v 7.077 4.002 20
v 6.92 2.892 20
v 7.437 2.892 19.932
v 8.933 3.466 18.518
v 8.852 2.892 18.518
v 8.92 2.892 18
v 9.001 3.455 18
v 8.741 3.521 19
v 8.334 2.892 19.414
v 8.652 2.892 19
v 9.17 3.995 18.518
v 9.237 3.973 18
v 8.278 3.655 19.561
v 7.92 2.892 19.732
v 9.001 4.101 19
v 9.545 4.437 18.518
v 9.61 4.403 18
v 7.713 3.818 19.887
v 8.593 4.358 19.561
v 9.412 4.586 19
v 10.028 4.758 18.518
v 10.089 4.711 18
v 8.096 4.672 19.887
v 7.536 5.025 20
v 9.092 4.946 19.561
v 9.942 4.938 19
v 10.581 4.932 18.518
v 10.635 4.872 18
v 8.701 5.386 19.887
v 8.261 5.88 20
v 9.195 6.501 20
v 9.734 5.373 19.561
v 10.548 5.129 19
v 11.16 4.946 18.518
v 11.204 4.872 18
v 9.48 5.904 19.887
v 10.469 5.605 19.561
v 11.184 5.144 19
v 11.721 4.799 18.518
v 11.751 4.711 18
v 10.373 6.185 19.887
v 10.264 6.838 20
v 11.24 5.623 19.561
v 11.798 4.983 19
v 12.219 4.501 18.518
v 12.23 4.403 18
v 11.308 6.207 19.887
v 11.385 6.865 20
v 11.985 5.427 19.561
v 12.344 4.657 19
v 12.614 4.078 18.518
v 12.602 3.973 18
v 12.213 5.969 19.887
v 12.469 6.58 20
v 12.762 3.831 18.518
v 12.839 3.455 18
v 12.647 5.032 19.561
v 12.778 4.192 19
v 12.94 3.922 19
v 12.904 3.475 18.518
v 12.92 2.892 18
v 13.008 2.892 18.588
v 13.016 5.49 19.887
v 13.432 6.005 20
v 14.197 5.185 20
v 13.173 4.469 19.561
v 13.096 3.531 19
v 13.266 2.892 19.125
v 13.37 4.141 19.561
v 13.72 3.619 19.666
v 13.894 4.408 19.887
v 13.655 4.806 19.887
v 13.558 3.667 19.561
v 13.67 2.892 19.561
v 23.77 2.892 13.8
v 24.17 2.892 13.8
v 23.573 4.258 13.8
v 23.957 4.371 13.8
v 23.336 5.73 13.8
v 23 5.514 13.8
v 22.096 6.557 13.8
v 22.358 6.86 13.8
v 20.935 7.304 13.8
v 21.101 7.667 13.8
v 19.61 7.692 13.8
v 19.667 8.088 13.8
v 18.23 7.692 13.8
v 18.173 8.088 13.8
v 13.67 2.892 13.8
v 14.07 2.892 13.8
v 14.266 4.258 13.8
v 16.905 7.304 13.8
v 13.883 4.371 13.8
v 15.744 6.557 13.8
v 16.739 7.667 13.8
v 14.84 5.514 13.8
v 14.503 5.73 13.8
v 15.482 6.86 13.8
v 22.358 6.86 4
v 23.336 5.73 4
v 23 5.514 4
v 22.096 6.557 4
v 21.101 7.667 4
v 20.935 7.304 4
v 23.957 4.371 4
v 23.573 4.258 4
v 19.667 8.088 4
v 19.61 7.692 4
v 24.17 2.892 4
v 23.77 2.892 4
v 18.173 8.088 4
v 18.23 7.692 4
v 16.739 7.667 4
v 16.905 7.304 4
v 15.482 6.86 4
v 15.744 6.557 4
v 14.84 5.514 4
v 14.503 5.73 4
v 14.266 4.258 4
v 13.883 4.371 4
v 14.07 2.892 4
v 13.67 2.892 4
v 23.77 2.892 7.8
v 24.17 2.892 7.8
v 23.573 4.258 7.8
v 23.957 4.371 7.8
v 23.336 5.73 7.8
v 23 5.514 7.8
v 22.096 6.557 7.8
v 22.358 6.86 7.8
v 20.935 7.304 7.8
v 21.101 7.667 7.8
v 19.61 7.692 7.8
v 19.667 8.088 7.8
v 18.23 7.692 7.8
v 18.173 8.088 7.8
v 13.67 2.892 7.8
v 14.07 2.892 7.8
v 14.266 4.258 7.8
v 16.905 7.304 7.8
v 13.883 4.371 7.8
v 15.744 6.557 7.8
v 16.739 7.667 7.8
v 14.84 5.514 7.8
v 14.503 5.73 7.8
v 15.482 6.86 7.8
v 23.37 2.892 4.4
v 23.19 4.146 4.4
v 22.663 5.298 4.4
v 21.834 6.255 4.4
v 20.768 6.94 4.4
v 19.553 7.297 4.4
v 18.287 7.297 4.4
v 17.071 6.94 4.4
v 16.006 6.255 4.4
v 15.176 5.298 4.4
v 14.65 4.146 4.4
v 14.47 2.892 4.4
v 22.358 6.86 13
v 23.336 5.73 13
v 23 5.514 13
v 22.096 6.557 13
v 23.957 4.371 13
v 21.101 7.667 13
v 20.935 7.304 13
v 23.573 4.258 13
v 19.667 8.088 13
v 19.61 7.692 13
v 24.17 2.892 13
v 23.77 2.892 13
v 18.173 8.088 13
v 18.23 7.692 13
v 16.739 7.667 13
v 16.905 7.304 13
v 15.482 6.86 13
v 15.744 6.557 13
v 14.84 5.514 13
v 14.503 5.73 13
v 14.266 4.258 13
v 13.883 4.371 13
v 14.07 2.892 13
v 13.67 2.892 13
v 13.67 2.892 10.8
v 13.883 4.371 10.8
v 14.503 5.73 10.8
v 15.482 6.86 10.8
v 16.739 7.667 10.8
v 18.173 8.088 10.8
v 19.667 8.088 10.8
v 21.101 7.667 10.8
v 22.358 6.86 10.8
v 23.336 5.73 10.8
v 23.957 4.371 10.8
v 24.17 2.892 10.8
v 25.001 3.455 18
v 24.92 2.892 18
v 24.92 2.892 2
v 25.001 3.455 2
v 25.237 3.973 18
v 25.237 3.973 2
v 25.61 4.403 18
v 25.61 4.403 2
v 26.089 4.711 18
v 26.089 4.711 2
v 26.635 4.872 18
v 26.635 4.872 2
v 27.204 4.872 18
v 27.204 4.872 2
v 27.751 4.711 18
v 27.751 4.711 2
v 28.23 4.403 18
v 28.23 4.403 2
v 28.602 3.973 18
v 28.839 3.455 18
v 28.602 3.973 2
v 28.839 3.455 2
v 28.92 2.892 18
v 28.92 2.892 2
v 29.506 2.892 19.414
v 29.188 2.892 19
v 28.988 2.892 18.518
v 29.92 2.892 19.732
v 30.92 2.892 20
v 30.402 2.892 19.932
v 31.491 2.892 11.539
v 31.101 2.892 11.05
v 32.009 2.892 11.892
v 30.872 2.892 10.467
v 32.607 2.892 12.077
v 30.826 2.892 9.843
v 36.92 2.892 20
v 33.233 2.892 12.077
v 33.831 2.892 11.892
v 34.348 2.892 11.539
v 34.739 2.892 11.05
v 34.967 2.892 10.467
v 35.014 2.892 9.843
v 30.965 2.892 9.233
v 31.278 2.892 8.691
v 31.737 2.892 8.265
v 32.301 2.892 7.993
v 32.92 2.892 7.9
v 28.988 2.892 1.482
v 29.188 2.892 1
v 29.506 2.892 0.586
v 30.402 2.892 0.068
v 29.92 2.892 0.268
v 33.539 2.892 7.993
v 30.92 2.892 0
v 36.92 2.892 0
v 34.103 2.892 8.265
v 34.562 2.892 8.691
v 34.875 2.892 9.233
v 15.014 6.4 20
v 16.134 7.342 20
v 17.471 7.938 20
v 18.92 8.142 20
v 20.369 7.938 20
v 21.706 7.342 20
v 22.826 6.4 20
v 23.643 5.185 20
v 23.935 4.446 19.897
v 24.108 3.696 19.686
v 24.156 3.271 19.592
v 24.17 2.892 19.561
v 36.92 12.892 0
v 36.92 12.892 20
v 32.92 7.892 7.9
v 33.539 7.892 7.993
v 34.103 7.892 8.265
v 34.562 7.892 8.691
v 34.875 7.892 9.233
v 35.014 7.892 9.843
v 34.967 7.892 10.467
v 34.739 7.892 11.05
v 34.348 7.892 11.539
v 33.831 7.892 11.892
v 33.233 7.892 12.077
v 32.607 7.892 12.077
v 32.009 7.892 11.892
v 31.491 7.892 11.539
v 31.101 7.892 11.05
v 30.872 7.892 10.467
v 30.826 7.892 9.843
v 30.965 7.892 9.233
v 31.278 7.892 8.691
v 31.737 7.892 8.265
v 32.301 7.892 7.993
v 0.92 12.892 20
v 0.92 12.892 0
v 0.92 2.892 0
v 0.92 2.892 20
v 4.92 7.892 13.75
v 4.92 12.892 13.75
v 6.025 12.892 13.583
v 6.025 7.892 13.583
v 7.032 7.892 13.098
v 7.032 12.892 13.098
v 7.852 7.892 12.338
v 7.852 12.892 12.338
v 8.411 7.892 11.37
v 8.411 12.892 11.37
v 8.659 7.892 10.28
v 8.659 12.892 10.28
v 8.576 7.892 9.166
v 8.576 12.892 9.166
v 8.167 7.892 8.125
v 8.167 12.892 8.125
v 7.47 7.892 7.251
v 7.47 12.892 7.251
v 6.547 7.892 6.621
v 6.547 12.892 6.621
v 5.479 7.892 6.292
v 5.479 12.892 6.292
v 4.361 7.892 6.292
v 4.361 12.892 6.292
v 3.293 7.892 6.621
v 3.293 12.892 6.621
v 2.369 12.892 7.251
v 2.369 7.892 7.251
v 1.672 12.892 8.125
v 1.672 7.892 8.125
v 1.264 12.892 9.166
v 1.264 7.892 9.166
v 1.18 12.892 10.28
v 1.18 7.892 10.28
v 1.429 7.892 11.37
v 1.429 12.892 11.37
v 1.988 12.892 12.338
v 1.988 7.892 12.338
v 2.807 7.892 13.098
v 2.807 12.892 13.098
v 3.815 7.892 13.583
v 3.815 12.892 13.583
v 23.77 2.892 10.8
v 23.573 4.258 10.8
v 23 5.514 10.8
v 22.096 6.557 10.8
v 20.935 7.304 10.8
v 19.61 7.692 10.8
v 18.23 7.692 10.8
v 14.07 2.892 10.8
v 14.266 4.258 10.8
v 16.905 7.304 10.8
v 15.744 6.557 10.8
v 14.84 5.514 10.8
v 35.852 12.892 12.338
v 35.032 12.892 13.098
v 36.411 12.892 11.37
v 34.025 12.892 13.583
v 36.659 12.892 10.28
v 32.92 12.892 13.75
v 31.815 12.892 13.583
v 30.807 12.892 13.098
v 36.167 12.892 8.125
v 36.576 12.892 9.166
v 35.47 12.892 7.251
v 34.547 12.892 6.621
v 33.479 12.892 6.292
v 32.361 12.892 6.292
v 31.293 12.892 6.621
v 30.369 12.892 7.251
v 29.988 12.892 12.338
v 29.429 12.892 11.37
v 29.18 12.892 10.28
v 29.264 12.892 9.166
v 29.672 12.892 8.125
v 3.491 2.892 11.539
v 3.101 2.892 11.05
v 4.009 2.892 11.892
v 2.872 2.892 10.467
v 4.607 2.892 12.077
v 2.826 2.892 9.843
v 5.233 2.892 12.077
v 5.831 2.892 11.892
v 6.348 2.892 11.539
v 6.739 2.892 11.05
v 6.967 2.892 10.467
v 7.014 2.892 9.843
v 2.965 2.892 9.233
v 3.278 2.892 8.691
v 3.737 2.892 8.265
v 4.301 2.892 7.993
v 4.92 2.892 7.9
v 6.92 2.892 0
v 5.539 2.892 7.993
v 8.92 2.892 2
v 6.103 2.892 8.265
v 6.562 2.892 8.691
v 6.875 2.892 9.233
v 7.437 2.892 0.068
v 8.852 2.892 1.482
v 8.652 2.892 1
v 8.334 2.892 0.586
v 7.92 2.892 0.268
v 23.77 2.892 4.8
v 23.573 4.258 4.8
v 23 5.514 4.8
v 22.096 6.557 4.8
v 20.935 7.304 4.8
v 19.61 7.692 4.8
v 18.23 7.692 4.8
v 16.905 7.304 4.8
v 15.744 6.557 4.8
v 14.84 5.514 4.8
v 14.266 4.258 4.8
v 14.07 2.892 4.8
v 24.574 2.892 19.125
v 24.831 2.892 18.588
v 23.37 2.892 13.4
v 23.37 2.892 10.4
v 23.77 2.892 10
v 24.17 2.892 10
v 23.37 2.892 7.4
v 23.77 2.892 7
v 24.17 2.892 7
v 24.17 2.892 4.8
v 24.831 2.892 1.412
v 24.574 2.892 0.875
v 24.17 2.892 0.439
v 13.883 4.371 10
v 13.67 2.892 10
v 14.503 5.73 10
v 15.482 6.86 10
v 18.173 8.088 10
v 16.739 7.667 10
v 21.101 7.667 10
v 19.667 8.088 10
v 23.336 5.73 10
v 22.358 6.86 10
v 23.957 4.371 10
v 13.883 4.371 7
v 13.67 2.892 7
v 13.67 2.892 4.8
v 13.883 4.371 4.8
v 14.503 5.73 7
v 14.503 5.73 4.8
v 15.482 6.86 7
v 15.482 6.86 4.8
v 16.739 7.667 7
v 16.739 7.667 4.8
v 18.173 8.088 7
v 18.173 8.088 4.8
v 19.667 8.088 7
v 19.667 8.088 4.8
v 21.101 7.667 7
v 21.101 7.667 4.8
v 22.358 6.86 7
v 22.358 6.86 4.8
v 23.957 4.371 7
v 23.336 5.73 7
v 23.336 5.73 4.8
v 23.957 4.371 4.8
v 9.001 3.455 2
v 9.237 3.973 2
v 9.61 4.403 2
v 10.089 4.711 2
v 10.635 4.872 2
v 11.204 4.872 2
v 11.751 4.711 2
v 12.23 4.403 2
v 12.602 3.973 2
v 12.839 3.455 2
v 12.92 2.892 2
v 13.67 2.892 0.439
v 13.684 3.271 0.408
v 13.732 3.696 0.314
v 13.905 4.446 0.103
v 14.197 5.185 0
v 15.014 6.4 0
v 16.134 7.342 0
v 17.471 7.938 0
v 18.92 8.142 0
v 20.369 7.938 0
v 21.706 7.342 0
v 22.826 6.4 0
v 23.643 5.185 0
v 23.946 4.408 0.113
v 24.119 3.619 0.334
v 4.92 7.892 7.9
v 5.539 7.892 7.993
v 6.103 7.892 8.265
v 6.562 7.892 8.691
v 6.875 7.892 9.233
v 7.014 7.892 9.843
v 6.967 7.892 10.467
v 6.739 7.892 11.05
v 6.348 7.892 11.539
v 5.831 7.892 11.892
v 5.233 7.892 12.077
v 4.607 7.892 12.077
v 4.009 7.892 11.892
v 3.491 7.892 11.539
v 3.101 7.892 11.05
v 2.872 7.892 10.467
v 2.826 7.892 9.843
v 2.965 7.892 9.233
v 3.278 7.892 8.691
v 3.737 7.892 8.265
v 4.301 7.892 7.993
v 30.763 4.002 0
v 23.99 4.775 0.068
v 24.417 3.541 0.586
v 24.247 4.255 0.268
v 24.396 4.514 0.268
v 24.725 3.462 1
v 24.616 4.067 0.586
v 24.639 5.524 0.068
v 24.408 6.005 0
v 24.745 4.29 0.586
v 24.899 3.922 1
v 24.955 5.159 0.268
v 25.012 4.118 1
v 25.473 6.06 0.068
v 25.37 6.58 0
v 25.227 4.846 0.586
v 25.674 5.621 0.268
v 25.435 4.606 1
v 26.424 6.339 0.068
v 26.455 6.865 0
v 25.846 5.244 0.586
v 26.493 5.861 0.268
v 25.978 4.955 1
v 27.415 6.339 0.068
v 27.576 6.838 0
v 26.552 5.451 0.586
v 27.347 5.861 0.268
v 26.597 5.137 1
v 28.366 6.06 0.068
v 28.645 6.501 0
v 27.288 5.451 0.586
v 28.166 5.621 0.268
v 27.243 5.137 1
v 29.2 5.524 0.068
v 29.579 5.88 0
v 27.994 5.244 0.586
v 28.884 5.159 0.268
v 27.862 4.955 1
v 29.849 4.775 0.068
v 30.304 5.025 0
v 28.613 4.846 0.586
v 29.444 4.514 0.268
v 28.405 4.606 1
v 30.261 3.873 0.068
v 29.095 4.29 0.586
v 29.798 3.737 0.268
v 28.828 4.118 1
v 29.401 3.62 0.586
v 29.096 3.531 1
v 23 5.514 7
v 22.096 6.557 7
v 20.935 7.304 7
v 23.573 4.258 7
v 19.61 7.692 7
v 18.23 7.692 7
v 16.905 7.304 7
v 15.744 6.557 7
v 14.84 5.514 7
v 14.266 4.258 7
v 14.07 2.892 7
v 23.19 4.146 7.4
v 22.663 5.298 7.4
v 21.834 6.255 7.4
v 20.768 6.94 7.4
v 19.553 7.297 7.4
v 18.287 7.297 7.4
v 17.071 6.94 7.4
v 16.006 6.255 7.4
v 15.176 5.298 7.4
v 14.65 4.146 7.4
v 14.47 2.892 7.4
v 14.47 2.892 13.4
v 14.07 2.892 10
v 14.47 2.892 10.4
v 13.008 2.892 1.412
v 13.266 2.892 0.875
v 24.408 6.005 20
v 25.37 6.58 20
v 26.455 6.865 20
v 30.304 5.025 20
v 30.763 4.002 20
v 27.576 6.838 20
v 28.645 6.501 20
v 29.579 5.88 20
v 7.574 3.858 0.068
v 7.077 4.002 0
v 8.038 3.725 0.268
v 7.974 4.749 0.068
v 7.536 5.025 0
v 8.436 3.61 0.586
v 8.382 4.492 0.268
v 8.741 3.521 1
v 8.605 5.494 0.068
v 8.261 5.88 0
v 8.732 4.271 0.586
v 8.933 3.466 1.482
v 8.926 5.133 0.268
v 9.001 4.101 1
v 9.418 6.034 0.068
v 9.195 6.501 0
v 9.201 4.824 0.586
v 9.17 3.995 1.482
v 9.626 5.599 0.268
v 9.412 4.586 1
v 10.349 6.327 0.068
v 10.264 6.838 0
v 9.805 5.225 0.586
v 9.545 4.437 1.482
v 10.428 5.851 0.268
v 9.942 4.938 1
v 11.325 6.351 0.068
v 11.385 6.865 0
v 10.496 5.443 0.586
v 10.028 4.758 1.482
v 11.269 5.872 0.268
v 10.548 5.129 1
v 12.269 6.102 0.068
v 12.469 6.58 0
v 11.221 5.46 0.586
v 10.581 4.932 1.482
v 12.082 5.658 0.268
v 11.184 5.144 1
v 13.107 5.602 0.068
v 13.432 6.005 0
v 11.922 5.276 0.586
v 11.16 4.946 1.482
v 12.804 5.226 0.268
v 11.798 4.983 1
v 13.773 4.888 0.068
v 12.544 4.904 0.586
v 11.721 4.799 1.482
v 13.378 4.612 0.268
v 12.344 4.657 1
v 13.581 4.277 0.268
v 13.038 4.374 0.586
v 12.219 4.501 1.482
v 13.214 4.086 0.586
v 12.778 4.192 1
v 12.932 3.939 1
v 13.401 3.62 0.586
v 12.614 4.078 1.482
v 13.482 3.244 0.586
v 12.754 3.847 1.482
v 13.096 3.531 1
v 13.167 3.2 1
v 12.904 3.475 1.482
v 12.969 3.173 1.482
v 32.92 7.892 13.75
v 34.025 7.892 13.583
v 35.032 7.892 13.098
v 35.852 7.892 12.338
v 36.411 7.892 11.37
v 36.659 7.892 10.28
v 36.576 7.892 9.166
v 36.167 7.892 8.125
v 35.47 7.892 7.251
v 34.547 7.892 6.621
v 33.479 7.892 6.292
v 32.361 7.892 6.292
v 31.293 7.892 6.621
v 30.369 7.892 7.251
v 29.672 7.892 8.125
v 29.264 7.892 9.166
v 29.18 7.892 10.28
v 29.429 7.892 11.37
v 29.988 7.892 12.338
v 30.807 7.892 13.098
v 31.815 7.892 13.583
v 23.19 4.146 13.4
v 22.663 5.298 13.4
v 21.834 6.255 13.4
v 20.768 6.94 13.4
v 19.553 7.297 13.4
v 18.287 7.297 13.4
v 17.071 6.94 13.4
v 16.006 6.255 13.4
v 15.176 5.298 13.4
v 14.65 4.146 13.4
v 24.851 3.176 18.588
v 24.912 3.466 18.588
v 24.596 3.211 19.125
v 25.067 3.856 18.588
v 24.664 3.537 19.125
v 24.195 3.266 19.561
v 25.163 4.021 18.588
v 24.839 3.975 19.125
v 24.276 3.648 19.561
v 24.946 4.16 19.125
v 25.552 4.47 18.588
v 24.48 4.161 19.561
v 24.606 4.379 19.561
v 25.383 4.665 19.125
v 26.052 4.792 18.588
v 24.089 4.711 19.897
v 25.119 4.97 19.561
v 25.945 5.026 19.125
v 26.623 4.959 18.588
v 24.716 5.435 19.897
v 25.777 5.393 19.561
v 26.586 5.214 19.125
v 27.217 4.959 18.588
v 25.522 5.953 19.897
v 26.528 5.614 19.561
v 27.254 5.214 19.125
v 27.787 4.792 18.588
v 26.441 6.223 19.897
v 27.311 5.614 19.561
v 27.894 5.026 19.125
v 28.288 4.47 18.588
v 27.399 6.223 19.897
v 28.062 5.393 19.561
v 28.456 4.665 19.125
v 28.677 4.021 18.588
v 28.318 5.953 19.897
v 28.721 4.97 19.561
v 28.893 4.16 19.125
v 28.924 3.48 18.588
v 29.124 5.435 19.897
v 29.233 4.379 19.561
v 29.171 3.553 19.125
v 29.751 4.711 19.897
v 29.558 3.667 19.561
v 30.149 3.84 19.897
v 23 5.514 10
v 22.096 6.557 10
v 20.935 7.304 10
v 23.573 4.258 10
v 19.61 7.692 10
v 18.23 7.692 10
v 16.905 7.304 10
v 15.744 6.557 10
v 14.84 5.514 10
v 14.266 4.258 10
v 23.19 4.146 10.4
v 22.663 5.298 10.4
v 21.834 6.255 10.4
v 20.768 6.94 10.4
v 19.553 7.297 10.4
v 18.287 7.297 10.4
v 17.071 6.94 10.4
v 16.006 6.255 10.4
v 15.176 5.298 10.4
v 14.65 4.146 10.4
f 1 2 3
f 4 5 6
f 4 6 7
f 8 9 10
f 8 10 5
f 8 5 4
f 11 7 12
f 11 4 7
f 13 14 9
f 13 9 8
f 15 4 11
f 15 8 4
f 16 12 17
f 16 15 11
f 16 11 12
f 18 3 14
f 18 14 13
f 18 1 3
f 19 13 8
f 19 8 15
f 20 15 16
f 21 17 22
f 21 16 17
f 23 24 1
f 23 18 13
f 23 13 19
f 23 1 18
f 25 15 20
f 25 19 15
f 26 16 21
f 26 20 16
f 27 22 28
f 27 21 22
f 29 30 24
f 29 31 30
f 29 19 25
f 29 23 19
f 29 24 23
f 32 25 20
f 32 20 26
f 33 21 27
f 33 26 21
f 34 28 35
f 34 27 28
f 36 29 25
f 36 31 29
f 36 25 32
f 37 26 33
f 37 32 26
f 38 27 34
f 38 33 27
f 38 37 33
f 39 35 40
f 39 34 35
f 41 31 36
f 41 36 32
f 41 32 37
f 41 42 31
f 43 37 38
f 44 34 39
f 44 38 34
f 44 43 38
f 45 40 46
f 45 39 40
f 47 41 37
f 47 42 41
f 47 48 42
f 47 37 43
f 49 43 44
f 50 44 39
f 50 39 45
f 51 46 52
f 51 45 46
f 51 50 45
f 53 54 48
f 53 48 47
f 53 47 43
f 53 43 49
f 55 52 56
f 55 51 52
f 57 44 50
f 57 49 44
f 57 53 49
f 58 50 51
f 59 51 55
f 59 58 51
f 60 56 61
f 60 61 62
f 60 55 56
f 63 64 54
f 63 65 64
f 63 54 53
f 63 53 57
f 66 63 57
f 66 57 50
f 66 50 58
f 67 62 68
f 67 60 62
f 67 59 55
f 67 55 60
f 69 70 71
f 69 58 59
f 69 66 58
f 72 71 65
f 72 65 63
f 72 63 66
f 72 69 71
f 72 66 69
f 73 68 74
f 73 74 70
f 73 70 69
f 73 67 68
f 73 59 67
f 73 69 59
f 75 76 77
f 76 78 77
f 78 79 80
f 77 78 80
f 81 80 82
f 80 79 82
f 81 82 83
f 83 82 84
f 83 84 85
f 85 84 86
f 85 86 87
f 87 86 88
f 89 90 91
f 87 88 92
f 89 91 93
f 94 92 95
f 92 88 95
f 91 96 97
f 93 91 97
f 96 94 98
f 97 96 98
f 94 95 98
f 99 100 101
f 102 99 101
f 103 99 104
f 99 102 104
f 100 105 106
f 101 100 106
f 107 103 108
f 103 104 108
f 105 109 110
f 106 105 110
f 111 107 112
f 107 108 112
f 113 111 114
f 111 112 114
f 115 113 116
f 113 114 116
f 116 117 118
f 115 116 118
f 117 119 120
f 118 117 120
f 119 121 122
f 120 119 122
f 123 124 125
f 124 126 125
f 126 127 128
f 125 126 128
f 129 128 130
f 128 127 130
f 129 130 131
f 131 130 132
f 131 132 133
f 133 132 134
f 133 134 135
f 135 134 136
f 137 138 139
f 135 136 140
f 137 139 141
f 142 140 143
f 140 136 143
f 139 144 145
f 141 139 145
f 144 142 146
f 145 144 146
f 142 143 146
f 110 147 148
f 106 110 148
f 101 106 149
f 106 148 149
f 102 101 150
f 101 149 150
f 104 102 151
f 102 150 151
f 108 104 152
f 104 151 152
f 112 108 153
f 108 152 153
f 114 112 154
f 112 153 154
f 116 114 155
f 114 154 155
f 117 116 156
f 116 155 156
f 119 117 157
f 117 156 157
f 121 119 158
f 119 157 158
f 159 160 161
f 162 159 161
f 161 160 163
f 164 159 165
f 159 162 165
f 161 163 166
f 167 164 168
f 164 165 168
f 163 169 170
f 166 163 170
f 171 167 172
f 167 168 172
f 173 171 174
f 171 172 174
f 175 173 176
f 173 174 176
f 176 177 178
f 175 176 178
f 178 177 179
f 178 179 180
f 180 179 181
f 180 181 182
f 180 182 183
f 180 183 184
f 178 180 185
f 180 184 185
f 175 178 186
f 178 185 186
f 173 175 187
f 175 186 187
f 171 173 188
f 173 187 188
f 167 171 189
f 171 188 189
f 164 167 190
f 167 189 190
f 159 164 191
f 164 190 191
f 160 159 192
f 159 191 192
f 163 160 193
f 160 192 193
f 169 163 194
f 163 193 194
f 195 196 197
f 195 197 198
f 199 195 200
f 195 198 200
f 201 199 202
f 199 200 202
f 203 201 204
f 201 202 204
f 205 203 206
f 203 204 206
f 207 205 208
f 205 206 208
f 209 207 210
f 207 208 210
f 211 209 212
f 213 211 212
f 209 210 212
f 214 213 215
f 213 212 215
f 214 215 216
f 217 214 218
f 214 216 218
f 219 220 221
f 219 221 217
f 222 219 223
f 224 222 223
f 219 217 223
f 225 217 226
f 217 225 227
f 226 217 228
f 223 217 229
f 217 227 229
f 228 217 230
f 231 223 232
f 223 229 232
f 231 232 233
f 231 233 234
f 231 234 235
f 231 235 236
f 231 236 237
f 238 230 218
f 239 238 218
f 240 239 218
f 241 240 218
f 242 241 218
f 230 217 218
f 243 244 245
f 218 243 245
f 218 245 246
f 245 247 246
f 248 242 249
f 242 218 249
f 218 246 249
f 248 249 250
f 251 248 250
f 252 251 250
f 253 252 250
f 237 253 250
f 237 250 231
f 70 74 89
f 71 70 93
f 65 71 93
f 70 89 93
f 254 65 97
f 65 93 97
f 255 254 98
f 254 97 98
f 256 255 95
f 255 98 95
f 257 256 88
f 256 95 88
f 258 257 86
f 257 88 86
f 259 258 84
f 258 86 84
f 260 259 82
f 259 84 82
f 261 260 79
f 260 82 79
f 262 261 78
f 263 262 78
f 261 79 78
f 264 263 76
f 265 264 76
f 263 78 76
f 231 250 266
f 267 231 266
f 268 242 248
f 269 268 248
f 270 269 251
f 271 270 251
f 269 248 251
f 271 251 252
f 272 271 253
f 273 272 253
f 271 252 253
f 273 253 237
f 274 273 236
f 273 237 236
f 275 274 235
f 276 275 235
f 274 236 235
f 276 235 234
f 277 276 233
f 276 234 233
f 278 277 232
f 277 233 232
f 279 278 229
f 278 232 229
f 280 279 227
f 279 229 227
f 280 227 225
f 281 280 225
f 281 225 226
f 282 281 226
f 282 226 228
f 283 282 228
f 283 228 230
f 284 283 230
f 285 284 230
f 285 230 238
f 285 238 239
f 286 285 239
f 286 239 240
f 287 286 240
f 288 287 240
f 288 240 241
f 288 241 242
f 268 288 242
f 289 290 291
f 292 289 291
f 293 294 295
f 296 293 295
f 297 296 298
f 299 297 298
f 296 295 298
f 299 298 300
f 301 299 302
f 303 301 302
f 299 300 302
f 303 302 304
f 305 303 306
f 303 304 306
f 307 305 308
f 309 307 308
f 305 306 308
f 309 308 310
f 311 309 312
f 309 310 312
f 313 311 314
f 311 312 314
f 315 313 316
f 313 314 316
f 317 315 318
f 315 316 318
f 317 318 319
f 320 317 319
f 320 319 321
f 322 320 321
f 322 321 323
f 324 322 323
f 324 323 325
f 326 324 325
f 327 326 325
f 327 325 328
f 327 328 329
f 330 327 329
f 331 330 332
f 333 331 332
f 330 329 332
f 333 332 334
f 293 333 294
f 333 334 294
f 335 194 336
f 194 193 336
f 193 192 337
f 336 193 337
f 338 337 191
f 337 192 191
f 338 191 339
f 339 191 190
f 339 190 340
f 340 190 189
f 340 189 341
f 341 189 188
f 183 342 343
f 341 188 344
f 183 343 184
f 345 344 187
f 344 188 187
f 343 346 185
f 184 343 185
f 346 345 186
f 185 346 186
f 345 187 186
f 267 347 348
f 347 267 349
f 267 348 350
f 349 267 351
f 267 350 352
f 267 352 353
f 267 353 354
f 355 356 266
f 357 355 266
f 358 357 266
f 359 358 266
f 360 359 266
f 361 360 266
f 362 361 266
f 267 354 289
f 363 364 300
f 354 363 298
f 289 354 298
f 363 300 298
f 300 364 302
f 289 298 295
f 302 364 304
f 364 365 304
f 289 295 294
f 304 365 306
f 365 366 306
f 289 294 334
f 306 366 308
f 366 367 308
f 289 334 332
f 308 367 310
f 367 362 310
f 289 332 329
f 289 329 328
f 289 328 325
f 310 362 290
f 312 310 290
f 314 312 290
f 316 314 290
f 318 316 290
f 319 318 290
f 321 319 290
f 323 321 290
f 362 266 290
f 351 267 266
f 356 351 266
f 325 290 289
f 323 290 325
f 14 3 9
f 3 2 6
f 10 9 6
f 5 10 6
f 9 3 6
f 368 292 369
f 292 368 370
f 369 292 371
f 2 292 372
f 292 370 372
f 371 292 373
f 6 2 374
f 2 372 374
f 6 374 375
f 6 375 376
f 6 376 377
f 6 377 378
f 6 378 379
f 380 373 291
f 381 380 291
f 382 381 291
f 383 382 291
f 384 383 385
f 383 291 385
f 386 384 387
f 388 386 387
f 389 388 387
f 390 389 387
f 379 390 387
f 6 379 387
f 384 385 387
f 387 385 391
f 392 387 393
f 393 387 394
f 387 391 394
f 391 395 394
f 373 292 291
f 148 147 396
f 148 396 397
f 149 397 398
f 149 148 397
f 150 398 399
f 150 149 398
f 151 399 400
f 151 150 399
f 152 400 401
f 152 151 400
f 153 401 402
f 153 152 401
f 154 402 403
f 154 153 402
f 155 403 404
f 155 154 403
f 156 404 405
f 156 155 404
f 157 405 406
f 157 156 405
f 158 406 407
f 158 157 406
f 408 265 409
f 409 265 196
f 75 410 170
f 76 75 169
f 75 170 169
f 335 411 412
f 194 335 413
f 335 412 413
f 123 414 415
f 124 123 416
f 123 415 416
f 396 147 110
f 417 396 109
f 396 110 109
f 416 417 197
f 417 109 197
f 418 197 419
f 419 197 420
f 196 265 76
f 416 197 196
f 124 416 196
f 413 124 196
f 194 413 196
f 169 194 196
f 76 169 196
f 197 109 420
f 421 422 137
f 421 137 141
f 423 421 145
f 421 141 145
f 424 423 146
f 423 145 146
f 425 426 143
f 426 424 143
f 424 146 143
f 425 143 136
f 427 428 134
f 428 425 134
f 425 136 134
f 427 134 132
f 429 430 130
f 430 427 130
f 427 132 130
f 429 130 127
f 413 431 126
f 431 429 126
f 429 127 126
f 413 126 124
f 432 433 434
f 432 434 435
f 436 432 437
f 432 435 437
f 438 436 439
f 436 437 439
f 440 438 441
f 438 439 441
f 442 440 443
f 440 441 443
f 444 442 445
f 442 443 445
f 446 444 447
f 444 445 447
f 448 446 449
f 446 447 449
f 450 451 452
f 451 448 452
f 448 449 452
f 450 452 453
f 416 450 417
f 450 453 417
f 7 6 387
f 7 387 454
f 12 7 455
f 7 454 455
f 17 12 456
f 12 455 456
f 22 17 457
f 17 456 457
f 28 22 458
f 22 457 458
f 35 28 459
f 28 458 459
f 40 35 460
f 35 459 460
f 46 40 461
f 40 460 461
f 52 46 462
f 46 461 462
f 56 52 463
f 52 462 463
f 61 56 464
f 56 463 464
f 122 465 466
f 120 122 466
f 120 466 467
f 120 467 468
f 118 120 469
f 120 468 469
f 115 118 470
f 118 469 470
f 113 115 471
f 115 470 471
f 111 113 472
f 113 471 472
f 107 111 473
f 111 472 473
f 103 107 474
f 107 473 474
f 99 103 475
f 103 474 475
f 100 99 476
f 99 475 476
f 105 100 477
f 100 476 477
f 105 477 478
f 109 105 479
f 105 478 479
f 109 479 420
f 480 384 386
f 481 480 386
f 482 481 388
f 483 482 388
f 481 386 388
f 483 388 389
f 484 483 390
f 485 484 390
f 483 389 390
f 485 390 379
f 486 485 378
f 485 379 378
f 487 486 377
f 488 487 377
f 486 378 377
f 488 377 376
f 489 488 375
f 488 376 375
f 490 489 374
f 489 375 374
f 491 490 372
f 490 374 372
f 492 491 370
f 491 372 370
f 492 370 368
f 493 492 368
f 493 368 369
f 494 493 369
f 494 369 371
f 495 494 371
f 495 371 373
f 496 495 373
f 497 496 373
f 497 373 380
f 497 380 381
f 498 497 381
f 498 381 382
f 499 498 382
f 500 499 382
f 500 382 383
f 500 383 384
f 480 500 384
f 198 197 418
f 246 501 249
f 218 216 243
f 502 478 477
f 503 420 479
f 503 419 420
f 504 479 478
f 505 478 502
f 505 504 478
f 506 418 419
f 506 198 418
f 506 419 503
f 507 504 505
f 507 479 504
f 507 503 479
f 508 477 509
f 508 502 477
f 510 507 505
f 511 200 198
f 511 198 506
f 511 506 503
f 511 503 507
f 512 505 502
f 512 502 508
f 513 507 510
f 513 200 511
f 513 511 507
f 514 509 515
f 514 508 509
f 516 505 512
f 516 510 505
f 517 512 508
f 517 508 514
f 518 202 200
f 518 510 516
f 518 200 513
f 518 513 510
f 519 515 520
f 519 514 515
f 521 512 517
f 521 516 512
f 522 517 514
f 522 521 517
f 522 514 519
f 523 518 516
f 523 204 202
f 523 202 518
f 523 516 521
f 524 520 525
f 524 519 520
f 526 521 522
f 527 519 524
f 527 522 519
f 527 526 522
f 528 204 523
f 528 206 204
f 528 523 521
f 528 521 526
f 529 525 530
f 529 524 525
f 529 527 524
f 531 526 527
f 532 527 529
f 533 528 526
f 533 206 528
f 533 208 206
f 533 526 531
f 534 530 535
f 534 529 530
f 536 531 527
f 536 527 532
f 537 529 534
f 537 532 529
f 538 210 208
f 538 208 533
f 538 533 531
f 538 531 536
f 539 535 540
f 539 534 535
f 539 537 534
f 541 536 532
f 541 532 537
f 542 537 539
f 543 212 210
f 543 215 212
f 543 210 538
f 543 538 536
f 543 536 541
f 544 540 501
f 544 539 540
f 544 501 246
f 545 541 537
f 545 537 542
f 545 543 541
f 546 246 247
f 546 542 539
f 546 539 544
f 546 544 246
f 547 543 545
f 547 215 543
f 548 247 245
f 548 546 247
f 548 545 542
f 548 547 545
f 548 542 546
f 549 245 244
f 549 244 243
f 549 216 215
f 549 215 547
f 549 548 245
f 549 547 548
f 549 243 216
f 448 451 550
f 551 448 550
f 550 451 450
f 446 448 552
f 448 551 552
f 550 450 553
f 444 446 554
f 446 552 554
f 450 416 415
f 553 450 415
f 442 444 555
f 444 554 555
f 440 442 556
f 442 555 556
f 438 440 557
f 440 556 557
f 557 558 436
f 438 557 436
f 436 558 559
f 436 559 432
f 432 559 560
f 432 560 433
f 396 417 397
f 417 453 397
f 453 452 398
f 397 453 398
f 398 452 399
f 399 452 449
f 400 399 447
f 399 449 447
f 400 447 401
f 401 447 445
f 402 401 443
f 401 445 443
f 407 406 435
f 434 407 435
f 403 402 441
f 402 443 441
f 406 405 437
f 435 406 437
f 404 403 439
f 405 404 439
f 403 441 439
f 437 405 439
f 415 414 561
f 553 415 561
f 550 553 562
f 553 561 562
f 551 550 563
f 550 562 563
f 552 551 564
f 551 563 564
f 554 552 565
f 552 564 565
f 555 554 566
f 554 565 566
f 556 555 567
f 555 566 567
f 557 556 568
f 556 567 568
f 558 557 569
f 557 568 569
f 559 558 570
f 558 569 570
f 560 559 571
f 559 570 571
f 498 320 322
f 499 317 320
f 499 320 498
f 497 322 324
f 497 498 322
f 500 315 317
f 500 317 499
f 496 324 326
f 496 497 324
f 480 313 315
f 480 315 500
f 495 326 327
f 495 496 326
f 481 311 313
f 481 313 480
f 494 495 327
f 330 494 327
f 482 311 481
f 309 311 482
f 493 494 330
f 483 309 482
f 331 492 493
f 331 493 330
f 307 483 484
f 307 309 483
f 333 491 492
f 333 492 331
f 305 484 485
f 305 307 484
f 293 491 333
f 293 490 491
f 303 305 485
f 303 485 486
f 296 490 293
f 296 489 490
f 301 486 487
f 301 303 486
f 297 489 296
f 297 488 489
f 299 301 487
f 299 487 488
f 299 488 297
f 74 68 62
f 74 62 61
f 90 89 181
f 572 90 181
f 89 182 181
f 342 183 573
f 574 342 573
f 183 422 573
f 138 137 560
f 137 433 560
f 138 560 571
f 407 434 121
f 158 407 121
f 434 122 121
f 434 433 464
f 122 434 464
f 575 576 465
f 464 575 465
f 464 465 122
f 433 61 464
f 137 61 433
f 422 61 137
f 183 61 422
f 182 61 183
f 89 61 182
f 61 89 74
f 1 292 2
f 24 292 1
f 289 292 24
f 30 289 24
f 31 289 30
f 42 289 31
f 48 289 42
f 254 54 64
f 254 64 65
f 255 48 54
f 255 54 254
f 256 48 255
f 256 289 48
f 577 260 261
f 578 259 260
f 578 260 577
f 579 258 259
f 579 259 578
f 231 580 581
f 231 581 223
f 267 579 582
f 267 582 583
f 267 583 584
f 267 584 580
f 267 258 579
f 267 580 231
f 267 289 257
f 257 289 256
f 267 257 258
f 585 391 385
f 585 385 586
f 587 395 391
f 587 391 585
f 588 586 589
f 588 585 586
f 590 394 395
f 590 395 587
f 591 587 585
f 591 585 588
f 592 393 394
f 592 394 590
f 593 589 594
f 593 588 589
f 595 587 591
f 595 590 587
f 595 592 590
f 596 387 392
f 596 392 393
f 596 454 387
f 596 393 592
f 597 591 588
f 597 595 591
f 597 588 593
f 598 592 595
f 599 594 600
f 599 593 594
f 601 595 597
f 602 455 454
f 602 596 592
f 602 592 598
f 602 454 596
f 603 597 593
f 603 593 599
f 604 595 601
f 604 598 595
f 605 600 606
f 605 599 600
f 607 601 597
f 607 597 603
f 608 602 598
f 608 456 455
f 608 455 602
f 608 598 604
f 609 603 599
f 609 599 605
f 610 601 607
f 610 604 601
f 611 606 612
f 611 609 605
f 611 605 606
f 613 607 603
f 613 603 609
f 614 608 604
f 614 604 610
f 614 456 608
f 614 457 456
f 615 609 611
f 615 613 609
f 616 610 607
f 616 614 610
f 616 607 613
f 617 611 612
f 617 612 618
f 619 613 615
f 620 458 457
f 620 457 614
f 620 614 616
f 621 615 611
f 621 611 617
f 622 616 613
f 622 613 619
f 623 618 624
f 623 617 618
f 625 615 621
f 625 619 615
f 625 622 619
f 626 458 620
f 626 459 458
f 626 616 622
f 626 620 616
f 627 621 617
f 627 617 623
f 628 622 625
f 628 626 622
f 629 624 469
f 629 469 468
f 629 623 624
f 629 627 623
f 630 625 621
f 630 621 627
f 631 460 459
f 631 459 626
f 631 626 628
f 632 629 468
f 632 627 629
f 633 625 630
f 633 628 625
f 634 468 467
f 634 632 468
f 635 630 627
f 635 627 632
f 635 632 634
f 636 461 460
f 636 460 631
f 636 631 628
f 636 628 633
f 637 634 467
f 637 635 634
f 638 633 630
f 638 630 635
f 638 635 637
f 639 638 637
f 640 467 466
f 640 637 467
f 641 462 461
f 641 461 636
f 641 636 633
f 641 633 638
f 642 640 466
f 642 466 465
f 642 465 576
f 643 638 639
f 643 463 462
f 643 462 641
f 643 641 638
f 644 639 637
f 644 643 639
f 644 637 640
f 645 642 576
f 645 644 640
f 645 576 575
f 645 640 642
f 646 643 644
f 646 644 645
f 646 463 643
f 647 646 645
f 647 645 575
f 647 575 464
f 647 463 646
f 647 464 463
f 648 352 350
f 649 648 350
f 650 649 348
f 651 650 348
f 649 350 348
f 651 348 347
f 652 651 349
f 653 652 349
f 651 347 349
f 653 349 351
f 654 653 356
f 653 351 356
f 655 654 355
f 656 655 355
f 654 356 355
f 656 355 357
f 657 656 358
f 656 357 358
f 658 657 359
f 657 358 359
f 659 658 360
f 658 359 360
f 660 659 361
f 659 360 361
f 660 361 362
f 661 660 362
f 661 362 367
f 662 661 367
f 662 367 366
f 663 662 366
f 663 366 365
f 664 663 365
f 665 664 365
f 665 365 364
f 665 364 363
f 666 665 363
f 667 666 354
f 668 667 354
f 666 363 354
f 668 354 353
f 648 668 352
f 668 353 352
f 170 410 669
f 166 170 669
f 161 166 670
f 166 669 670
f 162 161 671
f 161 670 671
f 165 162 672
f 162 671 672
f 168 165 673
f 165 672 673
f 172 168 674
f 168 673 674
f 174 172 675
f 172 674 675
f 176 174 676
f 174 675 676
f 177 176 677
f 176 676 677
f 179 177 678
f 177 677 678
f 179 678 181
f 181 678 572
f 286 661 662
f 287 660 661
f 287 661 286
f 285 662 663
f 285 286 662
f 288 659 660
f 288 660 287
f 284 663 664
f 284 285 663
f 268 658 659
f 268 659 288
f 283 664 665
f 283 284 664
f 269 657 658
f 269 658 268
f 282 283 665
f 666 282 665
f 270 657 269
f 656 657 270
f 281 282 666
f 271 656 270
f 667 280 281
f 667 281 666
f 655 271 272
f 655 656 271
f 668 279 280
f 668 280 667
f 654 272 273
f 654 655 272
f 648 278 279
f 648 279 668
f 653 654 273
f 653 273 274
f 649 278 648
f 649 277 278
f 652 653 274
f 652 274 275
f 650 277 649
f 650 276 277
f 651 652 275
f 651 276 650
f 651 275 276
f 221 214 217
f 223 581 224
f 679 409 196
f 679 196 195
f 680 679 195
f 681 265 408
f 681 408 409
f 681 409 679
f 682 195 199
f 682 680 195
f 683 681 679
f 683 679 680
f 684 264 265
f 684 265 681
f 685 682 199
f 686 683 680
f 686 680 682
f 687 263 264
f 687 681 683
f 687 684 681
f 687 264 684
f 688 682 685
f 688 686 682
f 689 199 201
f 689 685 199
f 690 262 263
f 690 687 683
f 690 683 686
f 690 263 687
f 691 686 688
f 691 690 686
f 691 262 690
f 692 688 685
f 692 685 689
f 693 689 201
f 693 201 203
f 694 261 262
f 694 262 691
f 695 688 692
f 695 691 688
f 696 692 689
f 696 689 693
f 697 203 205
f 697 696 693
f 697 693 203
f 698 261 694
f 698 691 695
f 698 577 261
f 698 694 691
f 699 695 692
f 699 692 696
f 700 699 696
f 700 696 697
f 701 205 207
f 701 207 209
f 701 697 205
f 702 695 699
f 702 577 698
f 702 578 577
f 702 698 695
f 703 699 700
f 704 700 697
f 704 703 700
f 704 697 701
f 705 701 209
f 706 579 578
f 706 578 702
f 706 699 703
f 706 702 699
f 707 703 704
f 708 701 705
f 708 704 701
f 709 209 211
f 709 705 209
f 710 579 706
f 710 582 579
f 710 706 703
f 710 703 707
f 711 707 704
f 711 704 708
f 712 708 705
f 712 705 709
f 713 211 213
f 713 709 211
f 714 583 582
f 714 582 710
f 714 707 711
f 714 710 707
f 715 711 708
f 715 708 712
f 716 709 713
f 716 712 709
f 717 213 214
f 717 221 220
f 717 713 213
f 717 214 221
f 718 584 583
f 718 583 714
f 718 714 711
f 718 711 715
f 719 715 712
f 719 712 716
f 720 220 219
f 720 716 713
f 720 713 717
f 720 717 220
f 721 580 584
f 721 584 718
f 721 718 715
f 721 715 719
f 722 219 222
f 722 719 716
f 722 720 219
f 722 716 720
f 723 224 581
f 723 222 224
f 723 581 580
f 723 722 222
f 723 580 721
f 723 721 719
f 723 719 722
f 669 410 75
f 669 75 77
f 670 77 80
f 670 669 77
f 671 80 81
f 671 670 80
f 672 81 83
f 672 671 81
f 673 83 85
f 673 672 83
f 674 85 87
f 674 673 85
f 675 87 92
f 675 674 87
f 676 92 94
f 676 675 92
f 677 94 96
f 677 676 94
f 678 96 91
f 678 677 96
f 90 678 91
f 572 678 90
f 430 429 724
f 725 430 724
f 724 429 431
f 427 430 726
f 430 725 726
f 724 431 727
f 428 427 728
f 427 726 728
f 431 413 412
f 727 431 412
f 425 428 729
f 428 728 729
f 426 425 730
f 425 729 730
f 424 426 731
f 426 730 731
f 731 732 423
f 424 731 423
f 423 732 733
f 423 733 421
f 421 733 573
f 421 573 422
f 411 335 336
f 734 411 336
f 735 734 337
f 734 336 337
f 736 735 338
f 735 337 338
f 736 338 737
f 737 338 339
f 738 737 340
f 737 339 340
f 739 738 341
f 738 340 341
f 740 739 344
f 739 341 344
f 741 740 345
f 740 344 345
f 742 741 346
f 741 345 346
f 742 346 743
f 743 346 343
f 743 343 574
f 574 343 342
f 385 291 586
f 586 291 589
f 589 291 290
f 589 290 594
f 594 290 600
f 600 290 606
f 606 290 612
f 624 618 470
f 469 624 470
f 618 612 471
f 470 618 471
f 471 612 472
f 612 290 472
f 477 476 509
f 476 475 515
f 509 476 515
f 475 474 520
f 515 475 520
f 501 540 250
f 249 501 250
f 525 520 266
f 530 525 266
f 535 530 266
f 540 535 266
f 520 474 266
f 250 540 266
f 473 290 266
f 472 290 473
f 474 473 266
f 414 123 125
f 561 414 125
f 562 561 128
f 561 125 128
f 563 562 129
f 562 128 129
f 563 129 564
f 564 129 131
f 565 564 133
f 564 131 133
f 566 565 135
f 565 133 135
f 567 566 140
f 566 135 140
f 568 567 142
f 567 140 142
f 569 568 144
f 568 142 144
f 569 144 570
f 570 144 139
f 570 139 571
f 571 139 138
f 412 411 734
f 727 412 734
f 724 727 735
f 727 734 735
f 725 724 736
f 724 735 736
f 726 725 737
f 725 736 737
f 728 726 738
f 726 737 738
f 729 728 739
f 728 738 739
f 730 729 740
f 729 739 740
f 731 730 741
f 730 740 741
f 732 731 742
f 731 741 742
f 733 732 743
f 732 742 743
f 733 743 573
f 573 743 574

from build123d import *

# Parameters (mm, degrees)
BOSS_EXTRUDE1_DEPTH = 20
SKETCH2_W           = 0.8000000000000007
SKETCH2_H           = 0.7999999999999989
SKETCH2_H_2         = 0.8000000000000007
CHAMFER1_SIZE       = 0.4
FILLET2_R           = 2
SKETCH3_R           = 2.100000000000004
SKETCH3_R_2         = 2.100000000000001
CUT_EXTRUDE1_DEPTH  = 44.163354633534205
SKETCH4_R           = 3.7499999999999996
SKETCH4_R_2         = 3.750000000000006
CUT_EXTRUDE2_DEPTH  = 5


# Some blends are built 0.0001 mm under size
with BuildPart() as part:
    # Sketch1 → Boss-Extrude1 (new body)
    with BuildSketch(Plane.XY):
        with BuildLine():
            Line((0.9198479389646088, 12.89190109356241), (0.9198479389646088, 2.89190109356241))
            Line((0.9198479389646081, 2.89190109356241), (8.919847938964608, 2.89190109356241))
            ThreePointArc((8.919847938964608, 2.8919010935624105), (10.919847938964608, 4.89190109356241), (12.919847938964608, 2.89190109356241))
            Line((12.919847938964608, 2.89190109356241), (13.669847938964606, 2.89190109356241))
            ThreePointArc((13.669847938964608, 2.8919010935624114), (18.919847938964608, 8.14190109356241), (24.169847938964608, 2.89190109356241))
            Line((24.169847938964608, 2.89190109356241), (24.919847938964608, 2.89190109356241))
            ThreePointArc((24.919847938964608, 2.8919010935624105), (26.919847938964608, 4.891901093562406), (28.919847938964608, 2.89190109356241))
            Line((28.919847938964605, 2.89190109356241), (36.91984793896461, 2.89190109356241))
            Line((36.91984793896461, 2.89190109356241), (36.91984793896461, 12.89190109356241))
            Line((36.91984793896461, 12.89190109356241), (0.9198479389646088, 12.89190109356241))
        make_face()
    extrude(amount=BOSS_EXTRUDE1_DEPTH)

    # Sweep2: sweep along a curve in space
    with BuildLine() as sweep2_path:
        ThreePointArc((24.169847938964608, 2.89190109356241, 20), (22.632158540193984, 6.604211694791784, 20), (18.919847938964608, 8.141901093562412, 20))
        ThreePointArc((18.919847938964608, 8.141901093562412, 20), (15.207537337735232, 6.604211694791786, 20), (13.669847938964606, 2.89190109356241, 20))
    # Sketch2 → Sweep2 (sweep)
    with BuildSketch(Plane.XZ.offset(-2.89190109356241)):
        with Locations((14.069847938964607, 13.400000000000006)):
            Rectangle(SKETCH2_W, SKETCH2_H)
        with Locations((14.069847938964607, 10.400000000000004)):
            Rectangle(SKETCH2_W, SKETCH2_H_2)
        with Locations((14.069847938964607, 7.400000000000003)):
            Rectangle(SKETCH2_W, SKETCH2_H_2)
        Polygon((13.669847938964608, 4.8000000000000025), (14.469847938964607, 4.8000000000000025), (14.469847938964609, 4.000000000000002), (13.669847938964608, 4.000000000000002), align=None)
    sweep(path=sweep2_path.line)

    # Chamfer1
    chamfer1_edges = [part.edges().sort_by_distance(p)[0] for p in [
        (18.919847938964608, 7.341901093562408, 4.000000000000002),
        (18.919847938964608, 7.341901093562411, 4.8000000000000025),
        (18.919847938964608, 7.341901093562411, 7.0000000000000036),
        (18.919847938964608, 7.341901093562413, 7.800000000000004),
        (18.919847938964608, 7.341901093562413, 13.800000000000004),
        (18.919847938964608, 7.341901093562411, 13.000000000000005),
        (18.919847938964608, 7.341901093562413, 10.800000000000004),
        (18.919847938964608, 7.341901093562411, 10.000000000000004),
    ]]
    chamfer(chamfer1_edges, length=CHAMFER1_SIZE - 0.0001)  # a hair under: the kernel refuses the full size

    # Fillet2
    # the kernel refuses this fillet: 2 mm, written as the material it takes off along each edge
    with BuildSketch(Plane(origin=(10.919847938964608, 2.89190109356241, 0), x_dir=(-0.003141587485879782, -0.9999950652018582, 0), z_dir=(0.9999950652018582, -0.003141587485879782, 0))) as fillet2_piece_1:
        with BuildLine():
            CenterArc((2 + FILLET2_R, -FILLET2_R), FILLET2_R, 89.99999999999997, 90)
            Line((2 + FILLET2_R, 2.2e-16), (2, 0))
            Line((2, 0), (2, -FILLET2_R))
        make_face()
    revolve(axis=Axis((10.919847938964608, 2.89190109356241, 0), (0, 0, -1)), revolution_arc=359.64000000000004, mode=Mode.SUBTRACT)
    with BuildSketch(Plane(origin=(26.919847938964608, 2.8919010935624057, 0), x_dir=(-0.003141587485879782, -0.9999950652018582, 0), z_dir=(0.9999950652018582, -0.003141587485879782, 0))) as fillet2_piece_2:
        with BuildLine():
            CenterArc((1.9999999999999987 + FILLET2_R, -FILLET2_R), FILLET2_R, 90, 90)
            Line((1.999999999999998, -FILLET2_R), (1.9999999999999987, 0))
            Line((1.9999999999999987, 0), (1.9999999999999987 + FILLET2_R, 0))
        make_face()
    revolve(axis=Axis((26.919847938964608, 2.8919010935624057, 0), (0, 0, -1)), revolution_arc=359.64, mode=Mode.SUBTRACT)
    with BuildSketch(Plane(origin=(10.919847938964608, 2.89190109356241, 20), x_dir=(-0.003141587485879782, -0.9999950652018582, 0), z_dir=(0.9999950652018582, -0.003141587485879782, 0))) as fillet2_piece_3:
        with BuildLine():
            CenterArc((1.9999999999999987 + FILLET2_R, FILLET2_R), FILLET2_R, 180, 90)
            Line((1.999999999999999, FILLET2_R), (1.9999999999999987, 0))
            Line((1.9999999999999987, 0), (1.9999999999999987 + FILLET2_R, 0))
        make_face()
    revolve(axis=Axis((10.919847938964608, 2.89190109356241, 20), (0, 0, -1)), revolution_arc=359.64000000000004, mode=Mode.SUBTRACT)
    with BuildSketch(Plane(origin=(26.919847938964608, 2.8919010935624057, 20), x_dir=(-0.003141587485879782, -0.9999950652018582, 0), z_dir=(0.9999950652018582, -0.003141587485879782, 0))) as fillet2_piece_4:
        with BuildLine():
            CenterArc((1.9999999999999987 + FILLET2_R, FILLET2_R), FILLET2_R, 180, 90)
            Line((1.999999999999998, FILLET2_R), (1.9999999999999987, 0))
            Line((1.9999999999999987, 0), (1.9999999999999987 + FILLET2_R, 0))
        make_face()
    revolve(axis=Axis((26.919847938964608, 2.8919010935624057, 20), (0, 0, -1)), revolution_arc=359.64, mode=Mode.SUBTRACT)

    # Sketch3 → Cut-Extrude1 (cut, through all)
    with BuildSketch(Plane.XZ.offset(-2.89190109356241)):
        with Locations(Location((32.9198479389646, 10, 0), (0, 0, 270))):
            Circle(SKETCH3_R)
        with Locations(Location((4.919847938964609, 10, 0), (0, 0, 270))):
            Circle(SKETCH3_R_2)
    extrude(amount=-CUT_EXTRUDE1_DEPTH, mode=Mode.SUBTRACT)

    # Sketch4 → Cut-Extrude2 (cut)
    with BuildSketch(Plane(origin=(0, 12.89190109356241, 0), x_dir=(1, 0, 0), z_dir=(0, 1, 0))):
        with Locations(Location((4.919847938964609, -10, 0), (0, 0, 270))):
            Circle(SKETCH4_R)
        with Locations(Location((32.9198479389646, -10, 0), (0, 0, 270))):
            Circle(SKETCH4_R_2)
    extrude(amount=-CUT_EXTRUDE2_DEPTH, mode=Mode.SUBTRACT)


solid = part.part
